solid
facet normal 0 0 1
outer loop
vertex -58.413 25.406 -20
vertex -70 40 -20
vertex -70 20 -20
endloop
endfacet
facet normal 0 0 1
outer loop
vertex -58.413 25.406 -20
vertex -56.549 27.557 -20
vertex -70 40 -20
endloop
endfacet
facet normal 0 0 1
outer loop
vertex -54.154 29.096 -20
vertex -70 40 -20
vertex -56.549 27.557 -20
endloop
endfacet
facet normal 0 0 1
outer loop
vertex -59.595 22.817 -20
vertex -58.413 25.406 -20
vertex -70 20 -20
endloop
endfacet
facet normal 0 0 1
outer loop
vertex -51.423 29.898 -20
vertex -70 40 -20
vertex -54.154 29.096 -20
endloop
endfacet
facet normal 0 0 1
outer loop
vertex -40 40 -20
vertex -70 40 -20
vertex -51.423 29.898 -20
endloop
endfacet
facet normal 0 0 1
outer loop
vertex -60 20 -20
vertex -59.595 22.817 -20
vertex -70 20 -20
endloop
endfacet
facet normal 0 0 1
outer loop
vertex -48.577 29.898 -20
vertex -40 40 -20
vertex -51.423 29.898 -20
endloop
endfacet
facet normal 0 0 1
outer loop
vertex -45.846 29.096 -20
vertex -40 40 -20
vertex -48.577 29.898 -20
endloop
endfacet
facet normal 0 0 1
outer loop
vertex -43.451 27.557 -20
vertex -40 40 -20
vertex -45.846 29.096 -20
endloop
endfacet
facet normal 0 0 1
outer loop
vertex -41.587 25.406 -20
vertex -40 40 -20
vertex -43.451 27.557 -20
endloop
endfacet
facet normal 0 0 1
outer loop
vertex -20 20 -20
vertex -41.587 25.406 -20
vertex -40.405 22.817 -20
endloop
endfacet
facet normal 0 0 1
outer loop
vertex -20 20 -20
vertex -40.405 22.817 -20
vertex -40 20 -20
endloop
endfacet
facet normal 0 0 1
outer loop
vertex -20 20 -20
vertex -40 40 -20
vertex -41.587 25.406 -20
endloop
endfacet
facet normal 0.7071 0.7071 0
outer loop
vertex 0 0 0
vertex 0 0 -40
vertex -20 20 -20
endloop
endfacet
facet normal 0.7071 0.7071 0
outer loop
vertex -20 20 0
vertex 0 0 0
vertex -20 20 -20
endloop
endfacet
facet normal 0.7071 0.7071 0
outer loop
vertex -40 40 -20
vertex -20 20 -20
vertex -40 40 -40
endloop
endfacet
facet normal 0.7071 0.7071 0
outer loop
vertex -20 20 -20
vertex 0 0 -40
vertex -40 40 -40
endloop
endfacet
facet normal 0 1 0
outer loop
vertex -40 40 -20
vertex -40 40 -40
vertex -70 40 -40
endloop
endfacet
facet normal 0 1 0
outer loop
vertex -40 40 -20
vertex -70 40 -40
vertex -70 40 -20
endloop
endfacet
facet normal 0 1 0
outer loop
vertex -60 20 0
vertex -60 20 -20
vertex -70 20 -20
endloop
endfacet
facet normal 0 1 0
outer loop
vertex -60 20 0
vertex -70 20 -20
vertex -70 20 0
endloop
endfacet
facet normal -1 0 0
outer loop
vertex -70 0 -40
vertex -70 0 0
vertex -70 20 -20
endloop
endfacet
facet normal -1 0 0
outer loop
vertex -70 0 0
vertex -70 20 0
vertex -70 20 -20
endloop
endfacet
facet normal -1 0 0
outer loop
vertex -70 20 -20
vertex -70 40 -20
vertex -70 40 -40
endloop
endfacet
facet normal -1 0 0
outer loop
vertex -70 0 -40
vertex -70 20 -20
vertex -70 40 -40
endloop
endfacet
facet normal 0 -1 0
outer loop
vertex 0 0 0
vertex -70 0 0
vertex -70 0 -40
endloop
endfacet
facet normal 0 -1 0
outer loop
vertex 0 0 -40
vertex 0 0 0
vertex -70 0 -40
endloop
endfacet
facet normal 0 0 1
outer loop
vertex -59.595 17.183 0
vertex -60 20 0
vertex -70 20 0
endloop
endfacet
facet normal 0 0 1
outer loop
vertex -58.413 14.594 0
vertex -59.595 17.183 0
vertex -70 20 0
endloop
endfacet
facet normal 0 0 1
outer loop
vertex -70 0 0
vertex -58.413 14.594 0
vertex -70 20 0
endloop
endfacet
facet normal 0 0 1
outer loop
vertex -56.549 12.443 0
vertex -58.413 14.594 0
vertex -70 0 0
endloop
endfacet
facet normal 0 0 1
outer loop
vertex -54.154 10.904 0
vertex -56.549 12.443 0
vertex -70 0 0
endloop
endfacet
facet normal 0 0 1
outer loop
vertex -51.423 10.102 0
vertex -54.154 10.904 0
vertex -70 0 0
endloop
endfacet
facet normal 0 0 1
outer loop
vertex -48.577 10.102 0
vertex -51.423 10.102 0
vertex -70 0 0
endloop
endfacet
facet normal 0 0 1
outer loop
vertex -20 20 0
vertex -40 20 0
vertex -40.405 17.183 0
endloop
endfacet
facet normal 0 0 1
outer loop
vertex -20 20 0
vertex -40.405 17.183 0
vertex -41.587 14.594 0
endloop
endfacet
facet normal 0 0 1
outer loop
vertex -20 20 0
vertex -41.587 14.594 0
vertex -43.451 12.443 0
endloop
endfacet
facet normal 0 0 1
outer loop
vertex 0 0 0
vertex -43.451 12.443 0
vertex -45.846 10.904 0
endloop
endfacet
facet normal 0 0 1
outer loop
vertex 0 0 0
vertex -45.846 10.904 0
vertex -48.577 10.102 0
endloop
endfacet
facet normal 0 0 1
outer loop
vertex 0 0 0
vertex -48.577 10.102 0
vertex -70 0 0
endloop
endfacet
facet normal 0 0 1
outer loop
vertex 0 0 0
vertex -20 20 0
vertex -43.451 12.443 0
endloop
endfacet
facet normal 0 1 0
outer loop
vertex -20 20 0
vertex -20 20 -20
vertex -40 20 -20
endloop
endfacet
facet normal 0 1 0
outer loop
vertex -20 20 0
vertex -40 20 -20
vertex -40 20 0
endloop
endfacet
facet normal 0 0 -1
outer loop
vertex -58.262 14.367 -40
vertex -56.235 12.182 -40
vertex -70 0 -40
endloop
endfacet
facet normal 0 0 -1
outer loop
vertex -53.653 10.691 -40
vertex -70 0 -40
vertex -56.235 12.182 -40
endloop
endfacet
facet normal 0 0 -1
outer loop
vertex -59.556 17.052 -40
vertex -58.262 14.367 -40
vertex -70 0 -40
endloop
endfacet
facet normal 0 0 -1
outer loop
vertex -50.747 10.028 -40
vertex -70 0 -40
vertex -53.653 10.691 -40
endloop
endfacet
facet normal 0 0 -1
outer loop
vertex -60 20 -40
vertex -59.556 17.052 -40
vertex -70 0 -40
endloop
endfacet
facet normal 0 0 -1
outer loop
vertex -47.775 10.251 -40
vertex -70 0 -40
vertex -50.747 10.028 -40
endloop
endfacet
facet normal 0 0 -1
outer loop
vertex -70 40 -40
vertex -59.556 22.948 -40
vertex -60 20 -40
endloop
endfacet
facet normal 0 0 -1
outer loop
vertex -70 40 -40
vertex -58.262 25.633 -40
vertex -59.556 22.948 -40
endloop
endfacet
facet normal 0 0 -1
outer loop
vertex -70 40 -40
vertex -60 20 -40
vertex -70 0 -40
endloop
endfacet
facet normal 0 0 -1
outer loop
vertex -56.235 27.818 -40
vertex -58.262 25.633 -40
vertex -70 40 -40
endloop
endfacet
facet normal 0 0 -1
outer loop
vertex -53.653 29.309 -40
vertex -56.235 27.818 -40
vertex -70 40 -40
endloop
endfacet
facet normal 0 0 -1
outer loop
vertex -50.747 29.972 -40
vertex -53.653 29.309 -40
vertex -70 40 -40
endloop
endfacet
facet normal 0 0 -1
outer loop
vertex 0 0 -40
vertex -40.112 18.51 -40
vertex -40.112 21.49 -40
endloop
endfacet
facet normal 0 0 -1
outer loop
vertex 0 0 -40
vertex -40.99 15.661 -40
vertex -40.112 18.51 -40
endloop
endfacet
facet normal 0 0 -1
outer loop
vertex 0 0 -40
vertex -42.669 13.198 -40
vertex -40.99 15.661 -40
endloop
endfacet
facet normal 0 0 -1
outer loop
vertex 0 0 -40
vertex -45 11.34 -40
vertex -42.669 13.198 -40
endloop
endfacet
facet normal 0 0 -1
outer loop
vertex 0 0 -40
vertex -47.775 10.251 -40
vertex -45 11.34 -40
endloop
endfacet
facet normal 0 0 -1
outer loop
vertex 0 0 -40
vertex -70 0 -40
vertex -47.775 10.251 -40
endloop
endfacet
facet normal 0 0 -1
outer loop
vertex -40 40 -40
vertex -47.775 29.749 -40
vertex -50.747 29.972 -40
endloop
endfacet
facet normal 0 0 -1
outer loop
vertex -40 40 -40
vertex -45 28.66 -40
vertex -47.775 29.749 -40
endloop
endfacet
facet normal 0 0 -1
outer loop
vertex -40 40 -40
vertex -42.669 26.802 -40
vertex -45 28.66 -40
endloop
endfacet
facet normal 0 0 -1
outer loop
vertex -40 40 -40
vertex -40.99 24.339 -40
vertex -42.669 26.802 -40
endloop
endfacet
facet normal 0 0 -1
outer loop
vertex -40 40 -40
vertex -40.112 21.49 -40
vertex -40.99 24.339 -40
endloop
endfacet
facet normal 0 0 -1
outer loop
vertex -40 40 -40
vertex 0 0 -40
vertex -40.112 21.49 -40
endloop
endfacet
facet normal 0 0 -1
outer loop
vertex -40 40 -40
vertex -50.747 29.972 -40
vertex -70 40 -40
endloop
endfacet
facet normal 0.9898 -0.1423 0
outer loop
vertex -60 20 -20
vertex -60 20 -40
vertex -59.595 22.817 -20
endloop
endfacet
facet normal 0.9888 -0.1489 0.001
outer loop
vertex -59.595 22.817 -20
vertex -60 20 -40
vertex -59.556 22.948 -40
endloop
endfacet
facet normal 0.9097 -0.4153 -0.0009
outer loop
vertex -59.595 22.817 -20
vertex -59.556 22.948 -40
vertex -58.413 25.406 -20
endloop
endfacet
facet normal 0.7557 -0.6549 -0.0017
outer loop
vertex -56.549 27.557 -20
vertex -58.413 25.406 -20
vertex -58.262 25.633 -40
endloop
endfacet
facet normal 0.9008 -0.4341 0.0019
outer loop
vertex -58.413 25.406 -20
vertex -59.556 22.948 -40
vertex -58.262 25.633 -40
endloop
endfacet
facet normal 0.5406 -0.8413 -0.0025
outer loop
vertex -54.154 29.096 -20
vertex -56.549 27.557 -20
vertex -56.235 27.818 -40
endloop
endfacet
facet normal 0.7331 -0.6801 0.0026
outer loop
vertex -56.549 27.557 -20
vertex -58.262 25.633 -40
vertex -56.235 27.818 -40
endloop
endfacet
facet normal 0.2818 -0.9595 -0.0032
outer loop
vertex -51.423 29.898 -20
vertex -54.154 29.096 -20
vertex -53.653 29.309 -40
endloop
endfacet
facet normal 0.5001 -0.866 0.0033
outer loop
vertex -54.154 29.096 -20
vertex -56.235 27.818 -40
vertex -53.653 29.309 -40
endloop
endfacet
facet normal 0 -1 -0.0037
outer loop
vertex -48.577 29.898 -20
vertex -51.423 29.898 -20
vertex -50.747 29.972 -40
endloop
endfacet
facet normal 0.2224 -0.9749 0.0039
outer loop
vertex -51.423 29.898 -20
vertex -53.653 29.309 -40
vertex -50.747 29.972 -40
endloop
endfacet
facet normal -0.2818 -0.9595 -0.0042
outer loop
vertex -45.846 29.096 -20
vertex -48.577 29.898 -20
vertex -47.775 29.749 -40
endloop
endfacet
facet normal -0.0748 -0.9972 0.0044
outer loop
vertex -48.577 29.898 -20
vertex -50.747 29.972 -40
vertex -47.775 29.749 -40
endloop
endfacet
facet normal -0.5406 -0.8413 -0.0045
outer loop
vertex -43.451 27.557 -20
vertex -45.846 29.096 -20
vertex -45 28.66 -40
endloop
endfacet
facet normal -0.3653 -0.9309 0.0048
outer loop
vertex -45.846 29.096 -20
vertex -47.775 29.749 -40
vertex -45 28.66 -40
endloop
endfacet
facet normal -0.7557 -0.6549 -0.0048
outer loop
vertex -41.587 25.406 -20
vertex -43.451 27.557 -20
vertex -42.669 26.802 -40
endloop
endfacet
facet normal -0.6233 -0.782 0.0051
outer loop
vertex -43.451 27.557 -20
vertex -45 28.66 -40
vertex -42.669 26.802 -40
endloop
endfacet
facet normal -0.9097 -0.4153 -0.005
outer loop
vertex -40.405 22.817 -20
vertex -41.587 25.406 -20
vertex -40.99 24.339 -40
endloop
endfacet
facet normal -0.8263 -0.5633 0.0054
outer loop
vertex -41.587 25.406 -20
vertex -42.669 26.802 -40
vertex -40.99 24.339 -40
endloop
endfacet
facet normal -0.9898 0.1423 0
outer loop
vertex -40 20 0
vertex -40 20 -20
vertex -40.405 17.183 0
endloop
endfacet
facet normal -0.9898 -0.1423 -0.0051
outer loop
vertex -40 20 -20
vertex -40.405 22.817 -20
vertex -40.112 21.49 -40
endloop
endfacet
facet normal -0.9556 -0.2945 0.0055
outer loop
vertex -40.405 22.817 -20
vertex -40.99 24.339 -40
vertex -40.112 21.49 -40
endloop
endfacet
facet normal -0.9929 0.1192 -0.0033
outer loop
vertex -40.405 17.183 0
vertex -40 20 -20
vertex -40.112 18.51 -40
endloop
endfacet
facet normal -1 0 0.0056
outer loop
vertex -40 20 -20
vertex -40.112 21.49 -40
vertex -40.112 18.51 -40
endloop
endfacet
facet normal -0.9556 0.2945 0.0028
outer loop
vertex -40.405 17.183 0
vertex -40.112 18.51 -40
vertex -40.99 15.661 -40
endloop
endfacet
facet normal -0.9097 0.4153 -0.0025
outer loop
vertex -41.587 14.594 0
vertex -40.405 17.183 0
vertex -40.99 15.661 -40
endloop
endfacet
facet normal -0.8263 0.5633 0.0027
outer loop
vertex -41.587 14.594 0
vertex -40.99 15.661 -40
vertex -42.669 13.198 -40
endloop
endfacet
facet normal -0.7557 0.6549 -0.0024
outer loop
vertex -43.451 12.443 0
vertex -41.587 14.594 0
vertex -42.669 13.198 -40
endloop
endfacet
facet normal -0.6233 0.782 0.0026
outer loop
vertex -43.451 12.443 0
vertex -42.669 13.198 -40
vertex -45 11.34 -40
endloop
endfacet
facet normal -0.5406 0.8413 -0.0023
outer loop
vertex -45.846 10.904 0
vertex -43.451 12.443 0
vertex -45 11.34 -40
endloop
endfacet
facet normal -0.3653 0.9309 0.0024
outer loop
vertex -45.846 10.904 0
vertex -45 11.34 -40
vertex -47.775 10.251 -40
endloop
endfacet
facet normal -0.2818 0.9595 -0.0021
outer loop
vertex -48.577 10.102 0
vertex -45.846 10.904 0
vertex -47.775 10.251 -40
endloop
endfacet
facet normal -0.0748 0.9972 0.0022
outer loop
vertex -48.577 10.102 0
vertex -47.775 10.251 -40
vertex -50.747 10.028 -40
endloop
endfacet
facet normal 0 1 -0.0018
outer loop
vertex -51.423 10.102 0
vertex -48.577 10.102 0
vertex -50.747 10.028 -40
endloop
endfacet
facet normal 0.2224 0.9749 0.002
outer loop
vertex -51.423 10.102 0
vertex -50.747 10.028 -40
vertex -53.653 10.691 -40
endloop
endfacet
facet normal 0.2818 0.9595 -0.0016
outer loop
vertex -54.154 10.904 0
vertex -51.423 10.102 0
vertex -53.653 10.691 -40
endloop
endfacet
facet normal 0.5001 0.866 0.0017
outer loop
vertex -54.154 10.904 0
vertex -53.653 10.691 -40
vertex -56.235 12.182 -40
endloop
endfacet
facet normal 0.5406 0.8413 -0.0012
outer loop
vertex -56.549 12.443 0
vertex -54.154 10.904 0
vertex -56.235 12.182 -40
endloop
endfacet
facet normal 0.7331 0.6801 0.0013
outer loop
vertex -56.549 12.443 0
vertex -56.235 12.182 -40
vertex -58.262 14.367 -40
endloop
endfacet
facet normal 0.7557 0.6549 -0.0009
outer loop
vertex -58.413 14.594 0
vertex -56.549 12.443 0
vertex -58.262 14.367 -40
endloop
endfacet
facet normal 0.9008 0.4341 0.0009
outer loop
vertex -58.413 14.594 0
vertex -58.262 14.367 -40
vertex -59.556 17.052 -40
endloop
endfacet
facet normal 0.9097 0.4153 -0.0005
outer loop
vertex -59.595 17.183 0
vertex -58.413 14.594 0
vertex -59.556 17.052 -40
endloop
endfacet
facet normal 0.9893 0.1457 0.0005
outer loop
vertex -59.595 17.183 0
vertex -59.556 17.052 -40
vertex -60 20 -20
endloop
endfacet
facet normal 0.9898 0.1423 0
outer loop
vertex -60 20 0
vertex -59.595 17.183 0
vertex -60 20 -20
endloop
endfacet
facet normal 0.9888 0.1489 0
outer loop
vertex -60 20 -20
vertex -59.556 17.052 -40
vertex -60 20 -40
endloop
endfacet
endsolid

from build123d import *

# Parameters (mm, degrees)
EXTRUDE_1_DEPTH     = 70
SKETCH_3_R          = 10
CUT_EXTRUDE_1_DEPTH = 70


with BuildPart() as part:
    # 스케치1 → 보스-돌출1 (new body)
    with BuildSketch(Plane(origin=(0, 0, 0), x_dir=(0, 0, -1), z_dir=(1, 0, 0))):
        Polygon((0, 0), (40, 0), (40, 40), (20, 40), (20, 20), (0, 20), align=None)
    extrude(amount=-EXTRUDE_1_DEPTH)

    # 스케치3 → 컷-돌출1 (cut)
    with BuildSketch(Plane(origin=(0, 0, -40), x_dir=(-1, 0, 0), z_dir=(0, 0, -1))):
        with Locations((50, 20)):
            Circle(SKETCH_3_R)
        Polygon((0, 0), (40, 40), (0, 40), align=None)
    extrude(amount=-CUT_EXTRUDE_1_DEPTH, mode=Mode.SUBTRACT)


solid = part.part
